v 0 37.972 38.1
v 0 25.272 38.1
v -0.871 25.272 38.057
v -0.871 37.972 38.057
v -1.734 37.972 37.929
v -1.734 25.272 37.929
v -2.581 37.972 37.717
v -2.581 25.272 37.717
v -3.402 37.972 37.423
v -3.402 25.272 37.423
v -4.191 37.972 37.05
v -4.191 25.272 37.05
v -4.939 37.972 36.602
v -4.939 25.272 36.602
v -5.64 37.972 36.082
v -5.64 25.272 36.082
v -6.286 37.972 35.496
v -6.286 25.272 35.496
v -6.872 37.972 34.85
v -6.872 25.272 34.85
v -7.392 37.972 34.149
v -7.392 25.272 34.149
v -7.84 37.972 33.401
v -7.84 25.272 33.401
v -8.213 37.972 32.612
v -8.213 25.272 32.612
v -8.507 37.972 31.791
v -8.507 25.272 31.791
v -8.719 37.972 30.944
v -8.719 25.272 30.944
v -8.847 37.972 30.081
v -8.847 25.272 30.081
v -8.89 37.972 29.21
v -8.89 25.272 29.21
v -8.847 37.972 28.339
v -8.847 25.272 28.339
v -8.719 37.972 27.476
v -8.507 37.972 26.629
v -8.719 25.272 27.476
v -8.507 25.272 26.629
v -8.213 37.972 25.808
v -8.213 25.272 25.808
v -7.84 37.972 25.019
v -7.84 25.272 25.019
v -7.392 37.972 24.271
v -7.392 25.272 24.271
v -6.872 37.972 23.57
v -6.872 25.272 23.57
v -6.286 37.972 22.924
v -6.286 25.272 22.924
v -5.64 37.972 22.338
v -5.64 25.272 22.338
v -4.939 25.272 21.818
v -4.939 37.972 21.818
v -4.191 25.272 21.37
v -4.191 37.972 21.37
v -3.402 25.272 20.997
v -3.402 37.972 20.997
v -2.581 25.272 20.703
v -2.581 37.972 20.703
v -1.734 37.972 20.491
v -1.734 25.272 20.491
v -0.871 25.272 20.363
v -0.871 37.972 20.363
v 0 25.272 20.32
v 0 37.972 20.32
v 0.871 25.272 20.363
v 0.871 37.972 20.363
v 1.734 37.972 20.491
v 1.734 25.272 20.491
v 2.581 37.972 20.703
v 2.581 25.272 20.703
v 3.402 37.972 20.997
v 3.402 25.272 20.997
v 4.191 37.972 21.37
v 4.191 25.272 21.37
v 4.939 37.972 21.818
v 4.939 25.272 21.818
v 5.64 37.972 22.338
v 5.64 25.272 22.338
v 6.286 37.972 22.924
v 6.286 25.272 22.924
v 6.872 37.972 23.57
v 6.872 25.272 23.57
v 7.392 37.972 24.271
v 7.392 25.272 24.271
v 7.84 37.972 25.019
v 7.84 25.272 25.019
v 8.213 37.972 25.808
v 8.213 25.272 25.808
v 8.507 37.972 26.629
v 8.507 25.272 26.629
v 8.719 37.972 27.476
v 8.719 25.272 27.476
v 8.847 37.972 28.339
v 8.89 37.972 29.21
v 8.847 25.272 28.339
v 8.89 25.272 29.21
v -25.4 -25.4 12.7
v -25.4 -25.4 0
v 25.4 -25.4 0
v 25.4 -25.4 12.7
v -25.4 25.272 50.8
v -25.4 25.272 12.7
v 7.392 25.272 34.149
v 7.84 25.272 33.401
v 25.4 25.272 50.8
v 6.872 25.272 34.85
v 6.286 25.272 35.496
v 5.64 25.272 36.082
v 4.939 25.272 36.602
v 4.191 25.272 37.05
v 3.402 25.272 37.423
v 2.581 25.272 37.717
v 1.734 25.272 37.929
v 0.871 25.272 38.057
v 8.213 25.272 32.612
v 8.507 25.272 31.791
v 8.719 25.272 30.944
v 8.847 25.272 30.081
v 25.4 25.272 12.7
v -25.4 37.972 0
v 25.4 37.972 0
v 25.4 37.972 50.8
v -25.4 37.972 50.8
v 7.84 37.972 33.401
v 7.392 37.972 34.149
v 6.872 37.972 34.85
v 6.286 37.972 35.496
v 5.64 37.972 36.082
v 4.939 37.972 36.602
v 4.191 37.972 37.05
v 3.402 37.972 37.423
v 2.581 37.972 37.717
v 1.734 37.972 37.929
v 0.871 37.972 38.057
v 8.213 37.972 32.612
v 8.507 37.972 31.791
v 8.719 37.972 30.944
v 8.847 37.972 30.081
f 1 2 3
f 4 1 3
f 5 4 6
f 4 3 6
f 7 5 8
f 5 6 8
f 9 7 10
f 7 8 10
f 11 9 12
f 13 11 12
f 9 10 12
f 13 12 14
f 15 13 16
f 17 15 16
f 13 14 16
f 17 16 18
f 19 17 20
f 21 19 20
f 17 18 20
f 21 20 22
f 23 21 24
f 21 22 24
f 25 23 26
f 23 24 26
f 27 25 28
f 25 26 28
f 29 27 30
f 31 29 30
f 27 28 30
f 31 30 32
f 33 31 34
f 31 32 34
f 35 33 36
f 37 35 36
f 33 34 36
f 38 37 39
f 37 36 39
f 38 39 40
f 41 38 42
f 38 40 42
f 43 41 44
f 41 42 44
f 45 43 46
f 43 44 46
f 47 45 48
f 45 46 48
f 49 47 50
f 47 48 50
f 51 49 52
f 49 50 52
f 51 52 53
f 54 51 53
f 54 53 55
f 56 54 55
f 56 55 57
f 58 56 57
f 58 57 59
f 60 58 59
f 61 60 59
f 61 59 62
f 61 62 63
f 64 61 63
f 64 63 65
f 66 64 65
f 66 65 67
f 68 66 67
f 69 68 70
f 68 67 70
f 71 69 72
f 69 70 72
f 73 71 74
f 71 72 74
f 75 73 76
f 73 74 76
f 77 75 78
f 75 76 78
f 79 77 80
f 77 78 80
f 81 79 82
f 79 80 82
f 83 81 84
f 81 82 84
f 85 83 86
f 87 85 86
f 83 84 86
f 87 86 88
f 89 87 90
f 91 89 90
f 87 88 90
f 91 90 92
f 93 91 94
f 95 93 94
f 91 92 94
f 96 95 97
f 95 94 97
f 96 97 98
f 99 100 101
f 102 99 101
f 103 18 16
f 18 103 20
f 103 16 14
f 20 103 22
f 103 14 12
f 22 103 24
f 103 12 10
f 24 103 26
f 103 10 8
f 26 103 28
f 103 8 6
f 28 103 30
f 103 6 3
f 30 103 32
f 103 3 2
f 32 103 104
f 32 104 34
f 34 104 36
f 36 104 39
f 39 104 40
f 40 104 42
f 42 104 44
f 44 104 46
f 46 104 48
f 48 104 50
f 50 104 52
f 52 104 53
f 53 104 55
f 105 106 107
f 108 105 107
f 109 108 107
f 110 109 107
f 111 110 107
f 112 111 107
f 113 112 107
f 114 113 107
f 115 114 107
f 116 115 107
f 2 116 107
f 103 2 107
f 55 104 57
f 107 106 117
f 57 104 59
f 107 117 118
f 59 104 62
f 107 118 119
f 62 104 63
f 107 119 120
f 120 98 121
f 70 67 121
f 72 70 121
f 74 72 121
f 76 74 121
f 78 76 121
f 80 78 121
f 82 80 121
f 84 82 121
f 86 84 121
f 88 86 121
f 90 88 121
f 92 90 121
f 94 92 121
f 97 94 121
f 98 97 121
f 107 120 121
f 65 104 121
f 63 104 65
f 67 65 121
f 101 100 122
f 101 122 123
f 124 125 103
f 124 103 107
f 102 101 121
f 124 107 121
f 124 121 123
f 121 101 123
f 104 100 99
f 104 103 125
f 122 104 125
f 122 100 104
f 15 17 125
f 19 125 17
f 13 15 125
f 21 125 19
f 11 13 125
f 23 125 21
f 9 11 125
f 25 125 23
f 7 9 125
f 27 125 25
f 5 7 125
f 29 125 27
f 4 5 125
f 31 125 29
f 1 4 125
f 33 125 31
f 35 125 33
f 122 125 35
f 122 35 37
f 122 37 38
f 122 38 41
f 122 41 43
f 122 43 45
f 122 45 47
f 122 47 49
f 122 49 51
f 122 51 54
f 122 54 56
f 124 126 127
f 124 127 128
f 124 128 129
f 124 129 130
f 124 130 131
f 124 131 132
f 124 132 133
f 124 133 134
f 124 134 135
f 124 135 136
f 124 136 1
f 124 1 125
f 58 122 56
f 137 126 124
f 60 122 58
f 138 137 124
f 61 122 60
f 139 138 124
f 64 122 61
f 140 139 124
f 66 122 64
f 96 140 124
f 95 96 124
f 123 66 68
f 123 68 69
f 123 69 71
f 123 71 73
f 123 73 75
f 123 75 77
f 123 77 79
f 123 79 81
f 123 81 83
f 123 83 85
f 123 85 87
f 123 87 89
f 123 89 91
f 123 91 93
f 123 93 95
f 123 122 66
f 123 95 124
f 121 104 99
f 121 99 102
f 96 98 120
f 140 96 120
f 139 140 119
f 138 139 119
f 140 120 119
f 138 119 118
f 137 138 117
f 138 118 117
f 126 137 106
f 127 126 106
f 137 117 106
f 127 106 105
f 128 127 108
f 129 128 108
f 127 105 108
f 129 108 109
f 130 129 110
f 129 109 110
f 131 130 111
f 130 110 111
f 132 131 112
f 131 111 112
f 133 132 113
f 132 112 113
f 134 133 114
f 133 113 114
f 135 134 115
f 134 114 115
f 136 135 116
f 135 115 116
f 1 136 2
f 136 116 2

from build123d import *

# Parameters (mm, degrees)
F0_W     = 50.8
F0_H     = 50.8
F1_DEPTH = 12.7
F2_W     = 50.8
F2_H     = 12.7
F3_DEPTH = 50.8
F5_DEPTH = 12.7


with BuildPart() as f1:
    # F0 (on Top) → F1 (new body)
    with BuildSketch(Plane.XY):
        Rectangle(F0_W, F0_H)
    extrude(amount=F1_DEPTH)

    # F2 (on Top) → F3 (join)
    with BuildSketch(Plane.XY):
        with Locations((0, 31.622227)):
            Rectangle(F2_W, F2_H)
    extrude(amount=F3_DEPTH)

    # F4 (on face) → F5 (cut)
    with BuildSketch(Plane.XZ.offset(-25.272227)):
        with BuildLine():
            ThreePointArc((0, 38.1), (-6.286179, 22.923821), (8.89, 29.21))
            ThreePointArc((8.89, 29.21), (6.286179, 35.496179), (0, 38.1))
        make_face()
    extrude(amount=-F5_DEPTH, mode=Mode.SUBTRACT)


solid = f1.part
